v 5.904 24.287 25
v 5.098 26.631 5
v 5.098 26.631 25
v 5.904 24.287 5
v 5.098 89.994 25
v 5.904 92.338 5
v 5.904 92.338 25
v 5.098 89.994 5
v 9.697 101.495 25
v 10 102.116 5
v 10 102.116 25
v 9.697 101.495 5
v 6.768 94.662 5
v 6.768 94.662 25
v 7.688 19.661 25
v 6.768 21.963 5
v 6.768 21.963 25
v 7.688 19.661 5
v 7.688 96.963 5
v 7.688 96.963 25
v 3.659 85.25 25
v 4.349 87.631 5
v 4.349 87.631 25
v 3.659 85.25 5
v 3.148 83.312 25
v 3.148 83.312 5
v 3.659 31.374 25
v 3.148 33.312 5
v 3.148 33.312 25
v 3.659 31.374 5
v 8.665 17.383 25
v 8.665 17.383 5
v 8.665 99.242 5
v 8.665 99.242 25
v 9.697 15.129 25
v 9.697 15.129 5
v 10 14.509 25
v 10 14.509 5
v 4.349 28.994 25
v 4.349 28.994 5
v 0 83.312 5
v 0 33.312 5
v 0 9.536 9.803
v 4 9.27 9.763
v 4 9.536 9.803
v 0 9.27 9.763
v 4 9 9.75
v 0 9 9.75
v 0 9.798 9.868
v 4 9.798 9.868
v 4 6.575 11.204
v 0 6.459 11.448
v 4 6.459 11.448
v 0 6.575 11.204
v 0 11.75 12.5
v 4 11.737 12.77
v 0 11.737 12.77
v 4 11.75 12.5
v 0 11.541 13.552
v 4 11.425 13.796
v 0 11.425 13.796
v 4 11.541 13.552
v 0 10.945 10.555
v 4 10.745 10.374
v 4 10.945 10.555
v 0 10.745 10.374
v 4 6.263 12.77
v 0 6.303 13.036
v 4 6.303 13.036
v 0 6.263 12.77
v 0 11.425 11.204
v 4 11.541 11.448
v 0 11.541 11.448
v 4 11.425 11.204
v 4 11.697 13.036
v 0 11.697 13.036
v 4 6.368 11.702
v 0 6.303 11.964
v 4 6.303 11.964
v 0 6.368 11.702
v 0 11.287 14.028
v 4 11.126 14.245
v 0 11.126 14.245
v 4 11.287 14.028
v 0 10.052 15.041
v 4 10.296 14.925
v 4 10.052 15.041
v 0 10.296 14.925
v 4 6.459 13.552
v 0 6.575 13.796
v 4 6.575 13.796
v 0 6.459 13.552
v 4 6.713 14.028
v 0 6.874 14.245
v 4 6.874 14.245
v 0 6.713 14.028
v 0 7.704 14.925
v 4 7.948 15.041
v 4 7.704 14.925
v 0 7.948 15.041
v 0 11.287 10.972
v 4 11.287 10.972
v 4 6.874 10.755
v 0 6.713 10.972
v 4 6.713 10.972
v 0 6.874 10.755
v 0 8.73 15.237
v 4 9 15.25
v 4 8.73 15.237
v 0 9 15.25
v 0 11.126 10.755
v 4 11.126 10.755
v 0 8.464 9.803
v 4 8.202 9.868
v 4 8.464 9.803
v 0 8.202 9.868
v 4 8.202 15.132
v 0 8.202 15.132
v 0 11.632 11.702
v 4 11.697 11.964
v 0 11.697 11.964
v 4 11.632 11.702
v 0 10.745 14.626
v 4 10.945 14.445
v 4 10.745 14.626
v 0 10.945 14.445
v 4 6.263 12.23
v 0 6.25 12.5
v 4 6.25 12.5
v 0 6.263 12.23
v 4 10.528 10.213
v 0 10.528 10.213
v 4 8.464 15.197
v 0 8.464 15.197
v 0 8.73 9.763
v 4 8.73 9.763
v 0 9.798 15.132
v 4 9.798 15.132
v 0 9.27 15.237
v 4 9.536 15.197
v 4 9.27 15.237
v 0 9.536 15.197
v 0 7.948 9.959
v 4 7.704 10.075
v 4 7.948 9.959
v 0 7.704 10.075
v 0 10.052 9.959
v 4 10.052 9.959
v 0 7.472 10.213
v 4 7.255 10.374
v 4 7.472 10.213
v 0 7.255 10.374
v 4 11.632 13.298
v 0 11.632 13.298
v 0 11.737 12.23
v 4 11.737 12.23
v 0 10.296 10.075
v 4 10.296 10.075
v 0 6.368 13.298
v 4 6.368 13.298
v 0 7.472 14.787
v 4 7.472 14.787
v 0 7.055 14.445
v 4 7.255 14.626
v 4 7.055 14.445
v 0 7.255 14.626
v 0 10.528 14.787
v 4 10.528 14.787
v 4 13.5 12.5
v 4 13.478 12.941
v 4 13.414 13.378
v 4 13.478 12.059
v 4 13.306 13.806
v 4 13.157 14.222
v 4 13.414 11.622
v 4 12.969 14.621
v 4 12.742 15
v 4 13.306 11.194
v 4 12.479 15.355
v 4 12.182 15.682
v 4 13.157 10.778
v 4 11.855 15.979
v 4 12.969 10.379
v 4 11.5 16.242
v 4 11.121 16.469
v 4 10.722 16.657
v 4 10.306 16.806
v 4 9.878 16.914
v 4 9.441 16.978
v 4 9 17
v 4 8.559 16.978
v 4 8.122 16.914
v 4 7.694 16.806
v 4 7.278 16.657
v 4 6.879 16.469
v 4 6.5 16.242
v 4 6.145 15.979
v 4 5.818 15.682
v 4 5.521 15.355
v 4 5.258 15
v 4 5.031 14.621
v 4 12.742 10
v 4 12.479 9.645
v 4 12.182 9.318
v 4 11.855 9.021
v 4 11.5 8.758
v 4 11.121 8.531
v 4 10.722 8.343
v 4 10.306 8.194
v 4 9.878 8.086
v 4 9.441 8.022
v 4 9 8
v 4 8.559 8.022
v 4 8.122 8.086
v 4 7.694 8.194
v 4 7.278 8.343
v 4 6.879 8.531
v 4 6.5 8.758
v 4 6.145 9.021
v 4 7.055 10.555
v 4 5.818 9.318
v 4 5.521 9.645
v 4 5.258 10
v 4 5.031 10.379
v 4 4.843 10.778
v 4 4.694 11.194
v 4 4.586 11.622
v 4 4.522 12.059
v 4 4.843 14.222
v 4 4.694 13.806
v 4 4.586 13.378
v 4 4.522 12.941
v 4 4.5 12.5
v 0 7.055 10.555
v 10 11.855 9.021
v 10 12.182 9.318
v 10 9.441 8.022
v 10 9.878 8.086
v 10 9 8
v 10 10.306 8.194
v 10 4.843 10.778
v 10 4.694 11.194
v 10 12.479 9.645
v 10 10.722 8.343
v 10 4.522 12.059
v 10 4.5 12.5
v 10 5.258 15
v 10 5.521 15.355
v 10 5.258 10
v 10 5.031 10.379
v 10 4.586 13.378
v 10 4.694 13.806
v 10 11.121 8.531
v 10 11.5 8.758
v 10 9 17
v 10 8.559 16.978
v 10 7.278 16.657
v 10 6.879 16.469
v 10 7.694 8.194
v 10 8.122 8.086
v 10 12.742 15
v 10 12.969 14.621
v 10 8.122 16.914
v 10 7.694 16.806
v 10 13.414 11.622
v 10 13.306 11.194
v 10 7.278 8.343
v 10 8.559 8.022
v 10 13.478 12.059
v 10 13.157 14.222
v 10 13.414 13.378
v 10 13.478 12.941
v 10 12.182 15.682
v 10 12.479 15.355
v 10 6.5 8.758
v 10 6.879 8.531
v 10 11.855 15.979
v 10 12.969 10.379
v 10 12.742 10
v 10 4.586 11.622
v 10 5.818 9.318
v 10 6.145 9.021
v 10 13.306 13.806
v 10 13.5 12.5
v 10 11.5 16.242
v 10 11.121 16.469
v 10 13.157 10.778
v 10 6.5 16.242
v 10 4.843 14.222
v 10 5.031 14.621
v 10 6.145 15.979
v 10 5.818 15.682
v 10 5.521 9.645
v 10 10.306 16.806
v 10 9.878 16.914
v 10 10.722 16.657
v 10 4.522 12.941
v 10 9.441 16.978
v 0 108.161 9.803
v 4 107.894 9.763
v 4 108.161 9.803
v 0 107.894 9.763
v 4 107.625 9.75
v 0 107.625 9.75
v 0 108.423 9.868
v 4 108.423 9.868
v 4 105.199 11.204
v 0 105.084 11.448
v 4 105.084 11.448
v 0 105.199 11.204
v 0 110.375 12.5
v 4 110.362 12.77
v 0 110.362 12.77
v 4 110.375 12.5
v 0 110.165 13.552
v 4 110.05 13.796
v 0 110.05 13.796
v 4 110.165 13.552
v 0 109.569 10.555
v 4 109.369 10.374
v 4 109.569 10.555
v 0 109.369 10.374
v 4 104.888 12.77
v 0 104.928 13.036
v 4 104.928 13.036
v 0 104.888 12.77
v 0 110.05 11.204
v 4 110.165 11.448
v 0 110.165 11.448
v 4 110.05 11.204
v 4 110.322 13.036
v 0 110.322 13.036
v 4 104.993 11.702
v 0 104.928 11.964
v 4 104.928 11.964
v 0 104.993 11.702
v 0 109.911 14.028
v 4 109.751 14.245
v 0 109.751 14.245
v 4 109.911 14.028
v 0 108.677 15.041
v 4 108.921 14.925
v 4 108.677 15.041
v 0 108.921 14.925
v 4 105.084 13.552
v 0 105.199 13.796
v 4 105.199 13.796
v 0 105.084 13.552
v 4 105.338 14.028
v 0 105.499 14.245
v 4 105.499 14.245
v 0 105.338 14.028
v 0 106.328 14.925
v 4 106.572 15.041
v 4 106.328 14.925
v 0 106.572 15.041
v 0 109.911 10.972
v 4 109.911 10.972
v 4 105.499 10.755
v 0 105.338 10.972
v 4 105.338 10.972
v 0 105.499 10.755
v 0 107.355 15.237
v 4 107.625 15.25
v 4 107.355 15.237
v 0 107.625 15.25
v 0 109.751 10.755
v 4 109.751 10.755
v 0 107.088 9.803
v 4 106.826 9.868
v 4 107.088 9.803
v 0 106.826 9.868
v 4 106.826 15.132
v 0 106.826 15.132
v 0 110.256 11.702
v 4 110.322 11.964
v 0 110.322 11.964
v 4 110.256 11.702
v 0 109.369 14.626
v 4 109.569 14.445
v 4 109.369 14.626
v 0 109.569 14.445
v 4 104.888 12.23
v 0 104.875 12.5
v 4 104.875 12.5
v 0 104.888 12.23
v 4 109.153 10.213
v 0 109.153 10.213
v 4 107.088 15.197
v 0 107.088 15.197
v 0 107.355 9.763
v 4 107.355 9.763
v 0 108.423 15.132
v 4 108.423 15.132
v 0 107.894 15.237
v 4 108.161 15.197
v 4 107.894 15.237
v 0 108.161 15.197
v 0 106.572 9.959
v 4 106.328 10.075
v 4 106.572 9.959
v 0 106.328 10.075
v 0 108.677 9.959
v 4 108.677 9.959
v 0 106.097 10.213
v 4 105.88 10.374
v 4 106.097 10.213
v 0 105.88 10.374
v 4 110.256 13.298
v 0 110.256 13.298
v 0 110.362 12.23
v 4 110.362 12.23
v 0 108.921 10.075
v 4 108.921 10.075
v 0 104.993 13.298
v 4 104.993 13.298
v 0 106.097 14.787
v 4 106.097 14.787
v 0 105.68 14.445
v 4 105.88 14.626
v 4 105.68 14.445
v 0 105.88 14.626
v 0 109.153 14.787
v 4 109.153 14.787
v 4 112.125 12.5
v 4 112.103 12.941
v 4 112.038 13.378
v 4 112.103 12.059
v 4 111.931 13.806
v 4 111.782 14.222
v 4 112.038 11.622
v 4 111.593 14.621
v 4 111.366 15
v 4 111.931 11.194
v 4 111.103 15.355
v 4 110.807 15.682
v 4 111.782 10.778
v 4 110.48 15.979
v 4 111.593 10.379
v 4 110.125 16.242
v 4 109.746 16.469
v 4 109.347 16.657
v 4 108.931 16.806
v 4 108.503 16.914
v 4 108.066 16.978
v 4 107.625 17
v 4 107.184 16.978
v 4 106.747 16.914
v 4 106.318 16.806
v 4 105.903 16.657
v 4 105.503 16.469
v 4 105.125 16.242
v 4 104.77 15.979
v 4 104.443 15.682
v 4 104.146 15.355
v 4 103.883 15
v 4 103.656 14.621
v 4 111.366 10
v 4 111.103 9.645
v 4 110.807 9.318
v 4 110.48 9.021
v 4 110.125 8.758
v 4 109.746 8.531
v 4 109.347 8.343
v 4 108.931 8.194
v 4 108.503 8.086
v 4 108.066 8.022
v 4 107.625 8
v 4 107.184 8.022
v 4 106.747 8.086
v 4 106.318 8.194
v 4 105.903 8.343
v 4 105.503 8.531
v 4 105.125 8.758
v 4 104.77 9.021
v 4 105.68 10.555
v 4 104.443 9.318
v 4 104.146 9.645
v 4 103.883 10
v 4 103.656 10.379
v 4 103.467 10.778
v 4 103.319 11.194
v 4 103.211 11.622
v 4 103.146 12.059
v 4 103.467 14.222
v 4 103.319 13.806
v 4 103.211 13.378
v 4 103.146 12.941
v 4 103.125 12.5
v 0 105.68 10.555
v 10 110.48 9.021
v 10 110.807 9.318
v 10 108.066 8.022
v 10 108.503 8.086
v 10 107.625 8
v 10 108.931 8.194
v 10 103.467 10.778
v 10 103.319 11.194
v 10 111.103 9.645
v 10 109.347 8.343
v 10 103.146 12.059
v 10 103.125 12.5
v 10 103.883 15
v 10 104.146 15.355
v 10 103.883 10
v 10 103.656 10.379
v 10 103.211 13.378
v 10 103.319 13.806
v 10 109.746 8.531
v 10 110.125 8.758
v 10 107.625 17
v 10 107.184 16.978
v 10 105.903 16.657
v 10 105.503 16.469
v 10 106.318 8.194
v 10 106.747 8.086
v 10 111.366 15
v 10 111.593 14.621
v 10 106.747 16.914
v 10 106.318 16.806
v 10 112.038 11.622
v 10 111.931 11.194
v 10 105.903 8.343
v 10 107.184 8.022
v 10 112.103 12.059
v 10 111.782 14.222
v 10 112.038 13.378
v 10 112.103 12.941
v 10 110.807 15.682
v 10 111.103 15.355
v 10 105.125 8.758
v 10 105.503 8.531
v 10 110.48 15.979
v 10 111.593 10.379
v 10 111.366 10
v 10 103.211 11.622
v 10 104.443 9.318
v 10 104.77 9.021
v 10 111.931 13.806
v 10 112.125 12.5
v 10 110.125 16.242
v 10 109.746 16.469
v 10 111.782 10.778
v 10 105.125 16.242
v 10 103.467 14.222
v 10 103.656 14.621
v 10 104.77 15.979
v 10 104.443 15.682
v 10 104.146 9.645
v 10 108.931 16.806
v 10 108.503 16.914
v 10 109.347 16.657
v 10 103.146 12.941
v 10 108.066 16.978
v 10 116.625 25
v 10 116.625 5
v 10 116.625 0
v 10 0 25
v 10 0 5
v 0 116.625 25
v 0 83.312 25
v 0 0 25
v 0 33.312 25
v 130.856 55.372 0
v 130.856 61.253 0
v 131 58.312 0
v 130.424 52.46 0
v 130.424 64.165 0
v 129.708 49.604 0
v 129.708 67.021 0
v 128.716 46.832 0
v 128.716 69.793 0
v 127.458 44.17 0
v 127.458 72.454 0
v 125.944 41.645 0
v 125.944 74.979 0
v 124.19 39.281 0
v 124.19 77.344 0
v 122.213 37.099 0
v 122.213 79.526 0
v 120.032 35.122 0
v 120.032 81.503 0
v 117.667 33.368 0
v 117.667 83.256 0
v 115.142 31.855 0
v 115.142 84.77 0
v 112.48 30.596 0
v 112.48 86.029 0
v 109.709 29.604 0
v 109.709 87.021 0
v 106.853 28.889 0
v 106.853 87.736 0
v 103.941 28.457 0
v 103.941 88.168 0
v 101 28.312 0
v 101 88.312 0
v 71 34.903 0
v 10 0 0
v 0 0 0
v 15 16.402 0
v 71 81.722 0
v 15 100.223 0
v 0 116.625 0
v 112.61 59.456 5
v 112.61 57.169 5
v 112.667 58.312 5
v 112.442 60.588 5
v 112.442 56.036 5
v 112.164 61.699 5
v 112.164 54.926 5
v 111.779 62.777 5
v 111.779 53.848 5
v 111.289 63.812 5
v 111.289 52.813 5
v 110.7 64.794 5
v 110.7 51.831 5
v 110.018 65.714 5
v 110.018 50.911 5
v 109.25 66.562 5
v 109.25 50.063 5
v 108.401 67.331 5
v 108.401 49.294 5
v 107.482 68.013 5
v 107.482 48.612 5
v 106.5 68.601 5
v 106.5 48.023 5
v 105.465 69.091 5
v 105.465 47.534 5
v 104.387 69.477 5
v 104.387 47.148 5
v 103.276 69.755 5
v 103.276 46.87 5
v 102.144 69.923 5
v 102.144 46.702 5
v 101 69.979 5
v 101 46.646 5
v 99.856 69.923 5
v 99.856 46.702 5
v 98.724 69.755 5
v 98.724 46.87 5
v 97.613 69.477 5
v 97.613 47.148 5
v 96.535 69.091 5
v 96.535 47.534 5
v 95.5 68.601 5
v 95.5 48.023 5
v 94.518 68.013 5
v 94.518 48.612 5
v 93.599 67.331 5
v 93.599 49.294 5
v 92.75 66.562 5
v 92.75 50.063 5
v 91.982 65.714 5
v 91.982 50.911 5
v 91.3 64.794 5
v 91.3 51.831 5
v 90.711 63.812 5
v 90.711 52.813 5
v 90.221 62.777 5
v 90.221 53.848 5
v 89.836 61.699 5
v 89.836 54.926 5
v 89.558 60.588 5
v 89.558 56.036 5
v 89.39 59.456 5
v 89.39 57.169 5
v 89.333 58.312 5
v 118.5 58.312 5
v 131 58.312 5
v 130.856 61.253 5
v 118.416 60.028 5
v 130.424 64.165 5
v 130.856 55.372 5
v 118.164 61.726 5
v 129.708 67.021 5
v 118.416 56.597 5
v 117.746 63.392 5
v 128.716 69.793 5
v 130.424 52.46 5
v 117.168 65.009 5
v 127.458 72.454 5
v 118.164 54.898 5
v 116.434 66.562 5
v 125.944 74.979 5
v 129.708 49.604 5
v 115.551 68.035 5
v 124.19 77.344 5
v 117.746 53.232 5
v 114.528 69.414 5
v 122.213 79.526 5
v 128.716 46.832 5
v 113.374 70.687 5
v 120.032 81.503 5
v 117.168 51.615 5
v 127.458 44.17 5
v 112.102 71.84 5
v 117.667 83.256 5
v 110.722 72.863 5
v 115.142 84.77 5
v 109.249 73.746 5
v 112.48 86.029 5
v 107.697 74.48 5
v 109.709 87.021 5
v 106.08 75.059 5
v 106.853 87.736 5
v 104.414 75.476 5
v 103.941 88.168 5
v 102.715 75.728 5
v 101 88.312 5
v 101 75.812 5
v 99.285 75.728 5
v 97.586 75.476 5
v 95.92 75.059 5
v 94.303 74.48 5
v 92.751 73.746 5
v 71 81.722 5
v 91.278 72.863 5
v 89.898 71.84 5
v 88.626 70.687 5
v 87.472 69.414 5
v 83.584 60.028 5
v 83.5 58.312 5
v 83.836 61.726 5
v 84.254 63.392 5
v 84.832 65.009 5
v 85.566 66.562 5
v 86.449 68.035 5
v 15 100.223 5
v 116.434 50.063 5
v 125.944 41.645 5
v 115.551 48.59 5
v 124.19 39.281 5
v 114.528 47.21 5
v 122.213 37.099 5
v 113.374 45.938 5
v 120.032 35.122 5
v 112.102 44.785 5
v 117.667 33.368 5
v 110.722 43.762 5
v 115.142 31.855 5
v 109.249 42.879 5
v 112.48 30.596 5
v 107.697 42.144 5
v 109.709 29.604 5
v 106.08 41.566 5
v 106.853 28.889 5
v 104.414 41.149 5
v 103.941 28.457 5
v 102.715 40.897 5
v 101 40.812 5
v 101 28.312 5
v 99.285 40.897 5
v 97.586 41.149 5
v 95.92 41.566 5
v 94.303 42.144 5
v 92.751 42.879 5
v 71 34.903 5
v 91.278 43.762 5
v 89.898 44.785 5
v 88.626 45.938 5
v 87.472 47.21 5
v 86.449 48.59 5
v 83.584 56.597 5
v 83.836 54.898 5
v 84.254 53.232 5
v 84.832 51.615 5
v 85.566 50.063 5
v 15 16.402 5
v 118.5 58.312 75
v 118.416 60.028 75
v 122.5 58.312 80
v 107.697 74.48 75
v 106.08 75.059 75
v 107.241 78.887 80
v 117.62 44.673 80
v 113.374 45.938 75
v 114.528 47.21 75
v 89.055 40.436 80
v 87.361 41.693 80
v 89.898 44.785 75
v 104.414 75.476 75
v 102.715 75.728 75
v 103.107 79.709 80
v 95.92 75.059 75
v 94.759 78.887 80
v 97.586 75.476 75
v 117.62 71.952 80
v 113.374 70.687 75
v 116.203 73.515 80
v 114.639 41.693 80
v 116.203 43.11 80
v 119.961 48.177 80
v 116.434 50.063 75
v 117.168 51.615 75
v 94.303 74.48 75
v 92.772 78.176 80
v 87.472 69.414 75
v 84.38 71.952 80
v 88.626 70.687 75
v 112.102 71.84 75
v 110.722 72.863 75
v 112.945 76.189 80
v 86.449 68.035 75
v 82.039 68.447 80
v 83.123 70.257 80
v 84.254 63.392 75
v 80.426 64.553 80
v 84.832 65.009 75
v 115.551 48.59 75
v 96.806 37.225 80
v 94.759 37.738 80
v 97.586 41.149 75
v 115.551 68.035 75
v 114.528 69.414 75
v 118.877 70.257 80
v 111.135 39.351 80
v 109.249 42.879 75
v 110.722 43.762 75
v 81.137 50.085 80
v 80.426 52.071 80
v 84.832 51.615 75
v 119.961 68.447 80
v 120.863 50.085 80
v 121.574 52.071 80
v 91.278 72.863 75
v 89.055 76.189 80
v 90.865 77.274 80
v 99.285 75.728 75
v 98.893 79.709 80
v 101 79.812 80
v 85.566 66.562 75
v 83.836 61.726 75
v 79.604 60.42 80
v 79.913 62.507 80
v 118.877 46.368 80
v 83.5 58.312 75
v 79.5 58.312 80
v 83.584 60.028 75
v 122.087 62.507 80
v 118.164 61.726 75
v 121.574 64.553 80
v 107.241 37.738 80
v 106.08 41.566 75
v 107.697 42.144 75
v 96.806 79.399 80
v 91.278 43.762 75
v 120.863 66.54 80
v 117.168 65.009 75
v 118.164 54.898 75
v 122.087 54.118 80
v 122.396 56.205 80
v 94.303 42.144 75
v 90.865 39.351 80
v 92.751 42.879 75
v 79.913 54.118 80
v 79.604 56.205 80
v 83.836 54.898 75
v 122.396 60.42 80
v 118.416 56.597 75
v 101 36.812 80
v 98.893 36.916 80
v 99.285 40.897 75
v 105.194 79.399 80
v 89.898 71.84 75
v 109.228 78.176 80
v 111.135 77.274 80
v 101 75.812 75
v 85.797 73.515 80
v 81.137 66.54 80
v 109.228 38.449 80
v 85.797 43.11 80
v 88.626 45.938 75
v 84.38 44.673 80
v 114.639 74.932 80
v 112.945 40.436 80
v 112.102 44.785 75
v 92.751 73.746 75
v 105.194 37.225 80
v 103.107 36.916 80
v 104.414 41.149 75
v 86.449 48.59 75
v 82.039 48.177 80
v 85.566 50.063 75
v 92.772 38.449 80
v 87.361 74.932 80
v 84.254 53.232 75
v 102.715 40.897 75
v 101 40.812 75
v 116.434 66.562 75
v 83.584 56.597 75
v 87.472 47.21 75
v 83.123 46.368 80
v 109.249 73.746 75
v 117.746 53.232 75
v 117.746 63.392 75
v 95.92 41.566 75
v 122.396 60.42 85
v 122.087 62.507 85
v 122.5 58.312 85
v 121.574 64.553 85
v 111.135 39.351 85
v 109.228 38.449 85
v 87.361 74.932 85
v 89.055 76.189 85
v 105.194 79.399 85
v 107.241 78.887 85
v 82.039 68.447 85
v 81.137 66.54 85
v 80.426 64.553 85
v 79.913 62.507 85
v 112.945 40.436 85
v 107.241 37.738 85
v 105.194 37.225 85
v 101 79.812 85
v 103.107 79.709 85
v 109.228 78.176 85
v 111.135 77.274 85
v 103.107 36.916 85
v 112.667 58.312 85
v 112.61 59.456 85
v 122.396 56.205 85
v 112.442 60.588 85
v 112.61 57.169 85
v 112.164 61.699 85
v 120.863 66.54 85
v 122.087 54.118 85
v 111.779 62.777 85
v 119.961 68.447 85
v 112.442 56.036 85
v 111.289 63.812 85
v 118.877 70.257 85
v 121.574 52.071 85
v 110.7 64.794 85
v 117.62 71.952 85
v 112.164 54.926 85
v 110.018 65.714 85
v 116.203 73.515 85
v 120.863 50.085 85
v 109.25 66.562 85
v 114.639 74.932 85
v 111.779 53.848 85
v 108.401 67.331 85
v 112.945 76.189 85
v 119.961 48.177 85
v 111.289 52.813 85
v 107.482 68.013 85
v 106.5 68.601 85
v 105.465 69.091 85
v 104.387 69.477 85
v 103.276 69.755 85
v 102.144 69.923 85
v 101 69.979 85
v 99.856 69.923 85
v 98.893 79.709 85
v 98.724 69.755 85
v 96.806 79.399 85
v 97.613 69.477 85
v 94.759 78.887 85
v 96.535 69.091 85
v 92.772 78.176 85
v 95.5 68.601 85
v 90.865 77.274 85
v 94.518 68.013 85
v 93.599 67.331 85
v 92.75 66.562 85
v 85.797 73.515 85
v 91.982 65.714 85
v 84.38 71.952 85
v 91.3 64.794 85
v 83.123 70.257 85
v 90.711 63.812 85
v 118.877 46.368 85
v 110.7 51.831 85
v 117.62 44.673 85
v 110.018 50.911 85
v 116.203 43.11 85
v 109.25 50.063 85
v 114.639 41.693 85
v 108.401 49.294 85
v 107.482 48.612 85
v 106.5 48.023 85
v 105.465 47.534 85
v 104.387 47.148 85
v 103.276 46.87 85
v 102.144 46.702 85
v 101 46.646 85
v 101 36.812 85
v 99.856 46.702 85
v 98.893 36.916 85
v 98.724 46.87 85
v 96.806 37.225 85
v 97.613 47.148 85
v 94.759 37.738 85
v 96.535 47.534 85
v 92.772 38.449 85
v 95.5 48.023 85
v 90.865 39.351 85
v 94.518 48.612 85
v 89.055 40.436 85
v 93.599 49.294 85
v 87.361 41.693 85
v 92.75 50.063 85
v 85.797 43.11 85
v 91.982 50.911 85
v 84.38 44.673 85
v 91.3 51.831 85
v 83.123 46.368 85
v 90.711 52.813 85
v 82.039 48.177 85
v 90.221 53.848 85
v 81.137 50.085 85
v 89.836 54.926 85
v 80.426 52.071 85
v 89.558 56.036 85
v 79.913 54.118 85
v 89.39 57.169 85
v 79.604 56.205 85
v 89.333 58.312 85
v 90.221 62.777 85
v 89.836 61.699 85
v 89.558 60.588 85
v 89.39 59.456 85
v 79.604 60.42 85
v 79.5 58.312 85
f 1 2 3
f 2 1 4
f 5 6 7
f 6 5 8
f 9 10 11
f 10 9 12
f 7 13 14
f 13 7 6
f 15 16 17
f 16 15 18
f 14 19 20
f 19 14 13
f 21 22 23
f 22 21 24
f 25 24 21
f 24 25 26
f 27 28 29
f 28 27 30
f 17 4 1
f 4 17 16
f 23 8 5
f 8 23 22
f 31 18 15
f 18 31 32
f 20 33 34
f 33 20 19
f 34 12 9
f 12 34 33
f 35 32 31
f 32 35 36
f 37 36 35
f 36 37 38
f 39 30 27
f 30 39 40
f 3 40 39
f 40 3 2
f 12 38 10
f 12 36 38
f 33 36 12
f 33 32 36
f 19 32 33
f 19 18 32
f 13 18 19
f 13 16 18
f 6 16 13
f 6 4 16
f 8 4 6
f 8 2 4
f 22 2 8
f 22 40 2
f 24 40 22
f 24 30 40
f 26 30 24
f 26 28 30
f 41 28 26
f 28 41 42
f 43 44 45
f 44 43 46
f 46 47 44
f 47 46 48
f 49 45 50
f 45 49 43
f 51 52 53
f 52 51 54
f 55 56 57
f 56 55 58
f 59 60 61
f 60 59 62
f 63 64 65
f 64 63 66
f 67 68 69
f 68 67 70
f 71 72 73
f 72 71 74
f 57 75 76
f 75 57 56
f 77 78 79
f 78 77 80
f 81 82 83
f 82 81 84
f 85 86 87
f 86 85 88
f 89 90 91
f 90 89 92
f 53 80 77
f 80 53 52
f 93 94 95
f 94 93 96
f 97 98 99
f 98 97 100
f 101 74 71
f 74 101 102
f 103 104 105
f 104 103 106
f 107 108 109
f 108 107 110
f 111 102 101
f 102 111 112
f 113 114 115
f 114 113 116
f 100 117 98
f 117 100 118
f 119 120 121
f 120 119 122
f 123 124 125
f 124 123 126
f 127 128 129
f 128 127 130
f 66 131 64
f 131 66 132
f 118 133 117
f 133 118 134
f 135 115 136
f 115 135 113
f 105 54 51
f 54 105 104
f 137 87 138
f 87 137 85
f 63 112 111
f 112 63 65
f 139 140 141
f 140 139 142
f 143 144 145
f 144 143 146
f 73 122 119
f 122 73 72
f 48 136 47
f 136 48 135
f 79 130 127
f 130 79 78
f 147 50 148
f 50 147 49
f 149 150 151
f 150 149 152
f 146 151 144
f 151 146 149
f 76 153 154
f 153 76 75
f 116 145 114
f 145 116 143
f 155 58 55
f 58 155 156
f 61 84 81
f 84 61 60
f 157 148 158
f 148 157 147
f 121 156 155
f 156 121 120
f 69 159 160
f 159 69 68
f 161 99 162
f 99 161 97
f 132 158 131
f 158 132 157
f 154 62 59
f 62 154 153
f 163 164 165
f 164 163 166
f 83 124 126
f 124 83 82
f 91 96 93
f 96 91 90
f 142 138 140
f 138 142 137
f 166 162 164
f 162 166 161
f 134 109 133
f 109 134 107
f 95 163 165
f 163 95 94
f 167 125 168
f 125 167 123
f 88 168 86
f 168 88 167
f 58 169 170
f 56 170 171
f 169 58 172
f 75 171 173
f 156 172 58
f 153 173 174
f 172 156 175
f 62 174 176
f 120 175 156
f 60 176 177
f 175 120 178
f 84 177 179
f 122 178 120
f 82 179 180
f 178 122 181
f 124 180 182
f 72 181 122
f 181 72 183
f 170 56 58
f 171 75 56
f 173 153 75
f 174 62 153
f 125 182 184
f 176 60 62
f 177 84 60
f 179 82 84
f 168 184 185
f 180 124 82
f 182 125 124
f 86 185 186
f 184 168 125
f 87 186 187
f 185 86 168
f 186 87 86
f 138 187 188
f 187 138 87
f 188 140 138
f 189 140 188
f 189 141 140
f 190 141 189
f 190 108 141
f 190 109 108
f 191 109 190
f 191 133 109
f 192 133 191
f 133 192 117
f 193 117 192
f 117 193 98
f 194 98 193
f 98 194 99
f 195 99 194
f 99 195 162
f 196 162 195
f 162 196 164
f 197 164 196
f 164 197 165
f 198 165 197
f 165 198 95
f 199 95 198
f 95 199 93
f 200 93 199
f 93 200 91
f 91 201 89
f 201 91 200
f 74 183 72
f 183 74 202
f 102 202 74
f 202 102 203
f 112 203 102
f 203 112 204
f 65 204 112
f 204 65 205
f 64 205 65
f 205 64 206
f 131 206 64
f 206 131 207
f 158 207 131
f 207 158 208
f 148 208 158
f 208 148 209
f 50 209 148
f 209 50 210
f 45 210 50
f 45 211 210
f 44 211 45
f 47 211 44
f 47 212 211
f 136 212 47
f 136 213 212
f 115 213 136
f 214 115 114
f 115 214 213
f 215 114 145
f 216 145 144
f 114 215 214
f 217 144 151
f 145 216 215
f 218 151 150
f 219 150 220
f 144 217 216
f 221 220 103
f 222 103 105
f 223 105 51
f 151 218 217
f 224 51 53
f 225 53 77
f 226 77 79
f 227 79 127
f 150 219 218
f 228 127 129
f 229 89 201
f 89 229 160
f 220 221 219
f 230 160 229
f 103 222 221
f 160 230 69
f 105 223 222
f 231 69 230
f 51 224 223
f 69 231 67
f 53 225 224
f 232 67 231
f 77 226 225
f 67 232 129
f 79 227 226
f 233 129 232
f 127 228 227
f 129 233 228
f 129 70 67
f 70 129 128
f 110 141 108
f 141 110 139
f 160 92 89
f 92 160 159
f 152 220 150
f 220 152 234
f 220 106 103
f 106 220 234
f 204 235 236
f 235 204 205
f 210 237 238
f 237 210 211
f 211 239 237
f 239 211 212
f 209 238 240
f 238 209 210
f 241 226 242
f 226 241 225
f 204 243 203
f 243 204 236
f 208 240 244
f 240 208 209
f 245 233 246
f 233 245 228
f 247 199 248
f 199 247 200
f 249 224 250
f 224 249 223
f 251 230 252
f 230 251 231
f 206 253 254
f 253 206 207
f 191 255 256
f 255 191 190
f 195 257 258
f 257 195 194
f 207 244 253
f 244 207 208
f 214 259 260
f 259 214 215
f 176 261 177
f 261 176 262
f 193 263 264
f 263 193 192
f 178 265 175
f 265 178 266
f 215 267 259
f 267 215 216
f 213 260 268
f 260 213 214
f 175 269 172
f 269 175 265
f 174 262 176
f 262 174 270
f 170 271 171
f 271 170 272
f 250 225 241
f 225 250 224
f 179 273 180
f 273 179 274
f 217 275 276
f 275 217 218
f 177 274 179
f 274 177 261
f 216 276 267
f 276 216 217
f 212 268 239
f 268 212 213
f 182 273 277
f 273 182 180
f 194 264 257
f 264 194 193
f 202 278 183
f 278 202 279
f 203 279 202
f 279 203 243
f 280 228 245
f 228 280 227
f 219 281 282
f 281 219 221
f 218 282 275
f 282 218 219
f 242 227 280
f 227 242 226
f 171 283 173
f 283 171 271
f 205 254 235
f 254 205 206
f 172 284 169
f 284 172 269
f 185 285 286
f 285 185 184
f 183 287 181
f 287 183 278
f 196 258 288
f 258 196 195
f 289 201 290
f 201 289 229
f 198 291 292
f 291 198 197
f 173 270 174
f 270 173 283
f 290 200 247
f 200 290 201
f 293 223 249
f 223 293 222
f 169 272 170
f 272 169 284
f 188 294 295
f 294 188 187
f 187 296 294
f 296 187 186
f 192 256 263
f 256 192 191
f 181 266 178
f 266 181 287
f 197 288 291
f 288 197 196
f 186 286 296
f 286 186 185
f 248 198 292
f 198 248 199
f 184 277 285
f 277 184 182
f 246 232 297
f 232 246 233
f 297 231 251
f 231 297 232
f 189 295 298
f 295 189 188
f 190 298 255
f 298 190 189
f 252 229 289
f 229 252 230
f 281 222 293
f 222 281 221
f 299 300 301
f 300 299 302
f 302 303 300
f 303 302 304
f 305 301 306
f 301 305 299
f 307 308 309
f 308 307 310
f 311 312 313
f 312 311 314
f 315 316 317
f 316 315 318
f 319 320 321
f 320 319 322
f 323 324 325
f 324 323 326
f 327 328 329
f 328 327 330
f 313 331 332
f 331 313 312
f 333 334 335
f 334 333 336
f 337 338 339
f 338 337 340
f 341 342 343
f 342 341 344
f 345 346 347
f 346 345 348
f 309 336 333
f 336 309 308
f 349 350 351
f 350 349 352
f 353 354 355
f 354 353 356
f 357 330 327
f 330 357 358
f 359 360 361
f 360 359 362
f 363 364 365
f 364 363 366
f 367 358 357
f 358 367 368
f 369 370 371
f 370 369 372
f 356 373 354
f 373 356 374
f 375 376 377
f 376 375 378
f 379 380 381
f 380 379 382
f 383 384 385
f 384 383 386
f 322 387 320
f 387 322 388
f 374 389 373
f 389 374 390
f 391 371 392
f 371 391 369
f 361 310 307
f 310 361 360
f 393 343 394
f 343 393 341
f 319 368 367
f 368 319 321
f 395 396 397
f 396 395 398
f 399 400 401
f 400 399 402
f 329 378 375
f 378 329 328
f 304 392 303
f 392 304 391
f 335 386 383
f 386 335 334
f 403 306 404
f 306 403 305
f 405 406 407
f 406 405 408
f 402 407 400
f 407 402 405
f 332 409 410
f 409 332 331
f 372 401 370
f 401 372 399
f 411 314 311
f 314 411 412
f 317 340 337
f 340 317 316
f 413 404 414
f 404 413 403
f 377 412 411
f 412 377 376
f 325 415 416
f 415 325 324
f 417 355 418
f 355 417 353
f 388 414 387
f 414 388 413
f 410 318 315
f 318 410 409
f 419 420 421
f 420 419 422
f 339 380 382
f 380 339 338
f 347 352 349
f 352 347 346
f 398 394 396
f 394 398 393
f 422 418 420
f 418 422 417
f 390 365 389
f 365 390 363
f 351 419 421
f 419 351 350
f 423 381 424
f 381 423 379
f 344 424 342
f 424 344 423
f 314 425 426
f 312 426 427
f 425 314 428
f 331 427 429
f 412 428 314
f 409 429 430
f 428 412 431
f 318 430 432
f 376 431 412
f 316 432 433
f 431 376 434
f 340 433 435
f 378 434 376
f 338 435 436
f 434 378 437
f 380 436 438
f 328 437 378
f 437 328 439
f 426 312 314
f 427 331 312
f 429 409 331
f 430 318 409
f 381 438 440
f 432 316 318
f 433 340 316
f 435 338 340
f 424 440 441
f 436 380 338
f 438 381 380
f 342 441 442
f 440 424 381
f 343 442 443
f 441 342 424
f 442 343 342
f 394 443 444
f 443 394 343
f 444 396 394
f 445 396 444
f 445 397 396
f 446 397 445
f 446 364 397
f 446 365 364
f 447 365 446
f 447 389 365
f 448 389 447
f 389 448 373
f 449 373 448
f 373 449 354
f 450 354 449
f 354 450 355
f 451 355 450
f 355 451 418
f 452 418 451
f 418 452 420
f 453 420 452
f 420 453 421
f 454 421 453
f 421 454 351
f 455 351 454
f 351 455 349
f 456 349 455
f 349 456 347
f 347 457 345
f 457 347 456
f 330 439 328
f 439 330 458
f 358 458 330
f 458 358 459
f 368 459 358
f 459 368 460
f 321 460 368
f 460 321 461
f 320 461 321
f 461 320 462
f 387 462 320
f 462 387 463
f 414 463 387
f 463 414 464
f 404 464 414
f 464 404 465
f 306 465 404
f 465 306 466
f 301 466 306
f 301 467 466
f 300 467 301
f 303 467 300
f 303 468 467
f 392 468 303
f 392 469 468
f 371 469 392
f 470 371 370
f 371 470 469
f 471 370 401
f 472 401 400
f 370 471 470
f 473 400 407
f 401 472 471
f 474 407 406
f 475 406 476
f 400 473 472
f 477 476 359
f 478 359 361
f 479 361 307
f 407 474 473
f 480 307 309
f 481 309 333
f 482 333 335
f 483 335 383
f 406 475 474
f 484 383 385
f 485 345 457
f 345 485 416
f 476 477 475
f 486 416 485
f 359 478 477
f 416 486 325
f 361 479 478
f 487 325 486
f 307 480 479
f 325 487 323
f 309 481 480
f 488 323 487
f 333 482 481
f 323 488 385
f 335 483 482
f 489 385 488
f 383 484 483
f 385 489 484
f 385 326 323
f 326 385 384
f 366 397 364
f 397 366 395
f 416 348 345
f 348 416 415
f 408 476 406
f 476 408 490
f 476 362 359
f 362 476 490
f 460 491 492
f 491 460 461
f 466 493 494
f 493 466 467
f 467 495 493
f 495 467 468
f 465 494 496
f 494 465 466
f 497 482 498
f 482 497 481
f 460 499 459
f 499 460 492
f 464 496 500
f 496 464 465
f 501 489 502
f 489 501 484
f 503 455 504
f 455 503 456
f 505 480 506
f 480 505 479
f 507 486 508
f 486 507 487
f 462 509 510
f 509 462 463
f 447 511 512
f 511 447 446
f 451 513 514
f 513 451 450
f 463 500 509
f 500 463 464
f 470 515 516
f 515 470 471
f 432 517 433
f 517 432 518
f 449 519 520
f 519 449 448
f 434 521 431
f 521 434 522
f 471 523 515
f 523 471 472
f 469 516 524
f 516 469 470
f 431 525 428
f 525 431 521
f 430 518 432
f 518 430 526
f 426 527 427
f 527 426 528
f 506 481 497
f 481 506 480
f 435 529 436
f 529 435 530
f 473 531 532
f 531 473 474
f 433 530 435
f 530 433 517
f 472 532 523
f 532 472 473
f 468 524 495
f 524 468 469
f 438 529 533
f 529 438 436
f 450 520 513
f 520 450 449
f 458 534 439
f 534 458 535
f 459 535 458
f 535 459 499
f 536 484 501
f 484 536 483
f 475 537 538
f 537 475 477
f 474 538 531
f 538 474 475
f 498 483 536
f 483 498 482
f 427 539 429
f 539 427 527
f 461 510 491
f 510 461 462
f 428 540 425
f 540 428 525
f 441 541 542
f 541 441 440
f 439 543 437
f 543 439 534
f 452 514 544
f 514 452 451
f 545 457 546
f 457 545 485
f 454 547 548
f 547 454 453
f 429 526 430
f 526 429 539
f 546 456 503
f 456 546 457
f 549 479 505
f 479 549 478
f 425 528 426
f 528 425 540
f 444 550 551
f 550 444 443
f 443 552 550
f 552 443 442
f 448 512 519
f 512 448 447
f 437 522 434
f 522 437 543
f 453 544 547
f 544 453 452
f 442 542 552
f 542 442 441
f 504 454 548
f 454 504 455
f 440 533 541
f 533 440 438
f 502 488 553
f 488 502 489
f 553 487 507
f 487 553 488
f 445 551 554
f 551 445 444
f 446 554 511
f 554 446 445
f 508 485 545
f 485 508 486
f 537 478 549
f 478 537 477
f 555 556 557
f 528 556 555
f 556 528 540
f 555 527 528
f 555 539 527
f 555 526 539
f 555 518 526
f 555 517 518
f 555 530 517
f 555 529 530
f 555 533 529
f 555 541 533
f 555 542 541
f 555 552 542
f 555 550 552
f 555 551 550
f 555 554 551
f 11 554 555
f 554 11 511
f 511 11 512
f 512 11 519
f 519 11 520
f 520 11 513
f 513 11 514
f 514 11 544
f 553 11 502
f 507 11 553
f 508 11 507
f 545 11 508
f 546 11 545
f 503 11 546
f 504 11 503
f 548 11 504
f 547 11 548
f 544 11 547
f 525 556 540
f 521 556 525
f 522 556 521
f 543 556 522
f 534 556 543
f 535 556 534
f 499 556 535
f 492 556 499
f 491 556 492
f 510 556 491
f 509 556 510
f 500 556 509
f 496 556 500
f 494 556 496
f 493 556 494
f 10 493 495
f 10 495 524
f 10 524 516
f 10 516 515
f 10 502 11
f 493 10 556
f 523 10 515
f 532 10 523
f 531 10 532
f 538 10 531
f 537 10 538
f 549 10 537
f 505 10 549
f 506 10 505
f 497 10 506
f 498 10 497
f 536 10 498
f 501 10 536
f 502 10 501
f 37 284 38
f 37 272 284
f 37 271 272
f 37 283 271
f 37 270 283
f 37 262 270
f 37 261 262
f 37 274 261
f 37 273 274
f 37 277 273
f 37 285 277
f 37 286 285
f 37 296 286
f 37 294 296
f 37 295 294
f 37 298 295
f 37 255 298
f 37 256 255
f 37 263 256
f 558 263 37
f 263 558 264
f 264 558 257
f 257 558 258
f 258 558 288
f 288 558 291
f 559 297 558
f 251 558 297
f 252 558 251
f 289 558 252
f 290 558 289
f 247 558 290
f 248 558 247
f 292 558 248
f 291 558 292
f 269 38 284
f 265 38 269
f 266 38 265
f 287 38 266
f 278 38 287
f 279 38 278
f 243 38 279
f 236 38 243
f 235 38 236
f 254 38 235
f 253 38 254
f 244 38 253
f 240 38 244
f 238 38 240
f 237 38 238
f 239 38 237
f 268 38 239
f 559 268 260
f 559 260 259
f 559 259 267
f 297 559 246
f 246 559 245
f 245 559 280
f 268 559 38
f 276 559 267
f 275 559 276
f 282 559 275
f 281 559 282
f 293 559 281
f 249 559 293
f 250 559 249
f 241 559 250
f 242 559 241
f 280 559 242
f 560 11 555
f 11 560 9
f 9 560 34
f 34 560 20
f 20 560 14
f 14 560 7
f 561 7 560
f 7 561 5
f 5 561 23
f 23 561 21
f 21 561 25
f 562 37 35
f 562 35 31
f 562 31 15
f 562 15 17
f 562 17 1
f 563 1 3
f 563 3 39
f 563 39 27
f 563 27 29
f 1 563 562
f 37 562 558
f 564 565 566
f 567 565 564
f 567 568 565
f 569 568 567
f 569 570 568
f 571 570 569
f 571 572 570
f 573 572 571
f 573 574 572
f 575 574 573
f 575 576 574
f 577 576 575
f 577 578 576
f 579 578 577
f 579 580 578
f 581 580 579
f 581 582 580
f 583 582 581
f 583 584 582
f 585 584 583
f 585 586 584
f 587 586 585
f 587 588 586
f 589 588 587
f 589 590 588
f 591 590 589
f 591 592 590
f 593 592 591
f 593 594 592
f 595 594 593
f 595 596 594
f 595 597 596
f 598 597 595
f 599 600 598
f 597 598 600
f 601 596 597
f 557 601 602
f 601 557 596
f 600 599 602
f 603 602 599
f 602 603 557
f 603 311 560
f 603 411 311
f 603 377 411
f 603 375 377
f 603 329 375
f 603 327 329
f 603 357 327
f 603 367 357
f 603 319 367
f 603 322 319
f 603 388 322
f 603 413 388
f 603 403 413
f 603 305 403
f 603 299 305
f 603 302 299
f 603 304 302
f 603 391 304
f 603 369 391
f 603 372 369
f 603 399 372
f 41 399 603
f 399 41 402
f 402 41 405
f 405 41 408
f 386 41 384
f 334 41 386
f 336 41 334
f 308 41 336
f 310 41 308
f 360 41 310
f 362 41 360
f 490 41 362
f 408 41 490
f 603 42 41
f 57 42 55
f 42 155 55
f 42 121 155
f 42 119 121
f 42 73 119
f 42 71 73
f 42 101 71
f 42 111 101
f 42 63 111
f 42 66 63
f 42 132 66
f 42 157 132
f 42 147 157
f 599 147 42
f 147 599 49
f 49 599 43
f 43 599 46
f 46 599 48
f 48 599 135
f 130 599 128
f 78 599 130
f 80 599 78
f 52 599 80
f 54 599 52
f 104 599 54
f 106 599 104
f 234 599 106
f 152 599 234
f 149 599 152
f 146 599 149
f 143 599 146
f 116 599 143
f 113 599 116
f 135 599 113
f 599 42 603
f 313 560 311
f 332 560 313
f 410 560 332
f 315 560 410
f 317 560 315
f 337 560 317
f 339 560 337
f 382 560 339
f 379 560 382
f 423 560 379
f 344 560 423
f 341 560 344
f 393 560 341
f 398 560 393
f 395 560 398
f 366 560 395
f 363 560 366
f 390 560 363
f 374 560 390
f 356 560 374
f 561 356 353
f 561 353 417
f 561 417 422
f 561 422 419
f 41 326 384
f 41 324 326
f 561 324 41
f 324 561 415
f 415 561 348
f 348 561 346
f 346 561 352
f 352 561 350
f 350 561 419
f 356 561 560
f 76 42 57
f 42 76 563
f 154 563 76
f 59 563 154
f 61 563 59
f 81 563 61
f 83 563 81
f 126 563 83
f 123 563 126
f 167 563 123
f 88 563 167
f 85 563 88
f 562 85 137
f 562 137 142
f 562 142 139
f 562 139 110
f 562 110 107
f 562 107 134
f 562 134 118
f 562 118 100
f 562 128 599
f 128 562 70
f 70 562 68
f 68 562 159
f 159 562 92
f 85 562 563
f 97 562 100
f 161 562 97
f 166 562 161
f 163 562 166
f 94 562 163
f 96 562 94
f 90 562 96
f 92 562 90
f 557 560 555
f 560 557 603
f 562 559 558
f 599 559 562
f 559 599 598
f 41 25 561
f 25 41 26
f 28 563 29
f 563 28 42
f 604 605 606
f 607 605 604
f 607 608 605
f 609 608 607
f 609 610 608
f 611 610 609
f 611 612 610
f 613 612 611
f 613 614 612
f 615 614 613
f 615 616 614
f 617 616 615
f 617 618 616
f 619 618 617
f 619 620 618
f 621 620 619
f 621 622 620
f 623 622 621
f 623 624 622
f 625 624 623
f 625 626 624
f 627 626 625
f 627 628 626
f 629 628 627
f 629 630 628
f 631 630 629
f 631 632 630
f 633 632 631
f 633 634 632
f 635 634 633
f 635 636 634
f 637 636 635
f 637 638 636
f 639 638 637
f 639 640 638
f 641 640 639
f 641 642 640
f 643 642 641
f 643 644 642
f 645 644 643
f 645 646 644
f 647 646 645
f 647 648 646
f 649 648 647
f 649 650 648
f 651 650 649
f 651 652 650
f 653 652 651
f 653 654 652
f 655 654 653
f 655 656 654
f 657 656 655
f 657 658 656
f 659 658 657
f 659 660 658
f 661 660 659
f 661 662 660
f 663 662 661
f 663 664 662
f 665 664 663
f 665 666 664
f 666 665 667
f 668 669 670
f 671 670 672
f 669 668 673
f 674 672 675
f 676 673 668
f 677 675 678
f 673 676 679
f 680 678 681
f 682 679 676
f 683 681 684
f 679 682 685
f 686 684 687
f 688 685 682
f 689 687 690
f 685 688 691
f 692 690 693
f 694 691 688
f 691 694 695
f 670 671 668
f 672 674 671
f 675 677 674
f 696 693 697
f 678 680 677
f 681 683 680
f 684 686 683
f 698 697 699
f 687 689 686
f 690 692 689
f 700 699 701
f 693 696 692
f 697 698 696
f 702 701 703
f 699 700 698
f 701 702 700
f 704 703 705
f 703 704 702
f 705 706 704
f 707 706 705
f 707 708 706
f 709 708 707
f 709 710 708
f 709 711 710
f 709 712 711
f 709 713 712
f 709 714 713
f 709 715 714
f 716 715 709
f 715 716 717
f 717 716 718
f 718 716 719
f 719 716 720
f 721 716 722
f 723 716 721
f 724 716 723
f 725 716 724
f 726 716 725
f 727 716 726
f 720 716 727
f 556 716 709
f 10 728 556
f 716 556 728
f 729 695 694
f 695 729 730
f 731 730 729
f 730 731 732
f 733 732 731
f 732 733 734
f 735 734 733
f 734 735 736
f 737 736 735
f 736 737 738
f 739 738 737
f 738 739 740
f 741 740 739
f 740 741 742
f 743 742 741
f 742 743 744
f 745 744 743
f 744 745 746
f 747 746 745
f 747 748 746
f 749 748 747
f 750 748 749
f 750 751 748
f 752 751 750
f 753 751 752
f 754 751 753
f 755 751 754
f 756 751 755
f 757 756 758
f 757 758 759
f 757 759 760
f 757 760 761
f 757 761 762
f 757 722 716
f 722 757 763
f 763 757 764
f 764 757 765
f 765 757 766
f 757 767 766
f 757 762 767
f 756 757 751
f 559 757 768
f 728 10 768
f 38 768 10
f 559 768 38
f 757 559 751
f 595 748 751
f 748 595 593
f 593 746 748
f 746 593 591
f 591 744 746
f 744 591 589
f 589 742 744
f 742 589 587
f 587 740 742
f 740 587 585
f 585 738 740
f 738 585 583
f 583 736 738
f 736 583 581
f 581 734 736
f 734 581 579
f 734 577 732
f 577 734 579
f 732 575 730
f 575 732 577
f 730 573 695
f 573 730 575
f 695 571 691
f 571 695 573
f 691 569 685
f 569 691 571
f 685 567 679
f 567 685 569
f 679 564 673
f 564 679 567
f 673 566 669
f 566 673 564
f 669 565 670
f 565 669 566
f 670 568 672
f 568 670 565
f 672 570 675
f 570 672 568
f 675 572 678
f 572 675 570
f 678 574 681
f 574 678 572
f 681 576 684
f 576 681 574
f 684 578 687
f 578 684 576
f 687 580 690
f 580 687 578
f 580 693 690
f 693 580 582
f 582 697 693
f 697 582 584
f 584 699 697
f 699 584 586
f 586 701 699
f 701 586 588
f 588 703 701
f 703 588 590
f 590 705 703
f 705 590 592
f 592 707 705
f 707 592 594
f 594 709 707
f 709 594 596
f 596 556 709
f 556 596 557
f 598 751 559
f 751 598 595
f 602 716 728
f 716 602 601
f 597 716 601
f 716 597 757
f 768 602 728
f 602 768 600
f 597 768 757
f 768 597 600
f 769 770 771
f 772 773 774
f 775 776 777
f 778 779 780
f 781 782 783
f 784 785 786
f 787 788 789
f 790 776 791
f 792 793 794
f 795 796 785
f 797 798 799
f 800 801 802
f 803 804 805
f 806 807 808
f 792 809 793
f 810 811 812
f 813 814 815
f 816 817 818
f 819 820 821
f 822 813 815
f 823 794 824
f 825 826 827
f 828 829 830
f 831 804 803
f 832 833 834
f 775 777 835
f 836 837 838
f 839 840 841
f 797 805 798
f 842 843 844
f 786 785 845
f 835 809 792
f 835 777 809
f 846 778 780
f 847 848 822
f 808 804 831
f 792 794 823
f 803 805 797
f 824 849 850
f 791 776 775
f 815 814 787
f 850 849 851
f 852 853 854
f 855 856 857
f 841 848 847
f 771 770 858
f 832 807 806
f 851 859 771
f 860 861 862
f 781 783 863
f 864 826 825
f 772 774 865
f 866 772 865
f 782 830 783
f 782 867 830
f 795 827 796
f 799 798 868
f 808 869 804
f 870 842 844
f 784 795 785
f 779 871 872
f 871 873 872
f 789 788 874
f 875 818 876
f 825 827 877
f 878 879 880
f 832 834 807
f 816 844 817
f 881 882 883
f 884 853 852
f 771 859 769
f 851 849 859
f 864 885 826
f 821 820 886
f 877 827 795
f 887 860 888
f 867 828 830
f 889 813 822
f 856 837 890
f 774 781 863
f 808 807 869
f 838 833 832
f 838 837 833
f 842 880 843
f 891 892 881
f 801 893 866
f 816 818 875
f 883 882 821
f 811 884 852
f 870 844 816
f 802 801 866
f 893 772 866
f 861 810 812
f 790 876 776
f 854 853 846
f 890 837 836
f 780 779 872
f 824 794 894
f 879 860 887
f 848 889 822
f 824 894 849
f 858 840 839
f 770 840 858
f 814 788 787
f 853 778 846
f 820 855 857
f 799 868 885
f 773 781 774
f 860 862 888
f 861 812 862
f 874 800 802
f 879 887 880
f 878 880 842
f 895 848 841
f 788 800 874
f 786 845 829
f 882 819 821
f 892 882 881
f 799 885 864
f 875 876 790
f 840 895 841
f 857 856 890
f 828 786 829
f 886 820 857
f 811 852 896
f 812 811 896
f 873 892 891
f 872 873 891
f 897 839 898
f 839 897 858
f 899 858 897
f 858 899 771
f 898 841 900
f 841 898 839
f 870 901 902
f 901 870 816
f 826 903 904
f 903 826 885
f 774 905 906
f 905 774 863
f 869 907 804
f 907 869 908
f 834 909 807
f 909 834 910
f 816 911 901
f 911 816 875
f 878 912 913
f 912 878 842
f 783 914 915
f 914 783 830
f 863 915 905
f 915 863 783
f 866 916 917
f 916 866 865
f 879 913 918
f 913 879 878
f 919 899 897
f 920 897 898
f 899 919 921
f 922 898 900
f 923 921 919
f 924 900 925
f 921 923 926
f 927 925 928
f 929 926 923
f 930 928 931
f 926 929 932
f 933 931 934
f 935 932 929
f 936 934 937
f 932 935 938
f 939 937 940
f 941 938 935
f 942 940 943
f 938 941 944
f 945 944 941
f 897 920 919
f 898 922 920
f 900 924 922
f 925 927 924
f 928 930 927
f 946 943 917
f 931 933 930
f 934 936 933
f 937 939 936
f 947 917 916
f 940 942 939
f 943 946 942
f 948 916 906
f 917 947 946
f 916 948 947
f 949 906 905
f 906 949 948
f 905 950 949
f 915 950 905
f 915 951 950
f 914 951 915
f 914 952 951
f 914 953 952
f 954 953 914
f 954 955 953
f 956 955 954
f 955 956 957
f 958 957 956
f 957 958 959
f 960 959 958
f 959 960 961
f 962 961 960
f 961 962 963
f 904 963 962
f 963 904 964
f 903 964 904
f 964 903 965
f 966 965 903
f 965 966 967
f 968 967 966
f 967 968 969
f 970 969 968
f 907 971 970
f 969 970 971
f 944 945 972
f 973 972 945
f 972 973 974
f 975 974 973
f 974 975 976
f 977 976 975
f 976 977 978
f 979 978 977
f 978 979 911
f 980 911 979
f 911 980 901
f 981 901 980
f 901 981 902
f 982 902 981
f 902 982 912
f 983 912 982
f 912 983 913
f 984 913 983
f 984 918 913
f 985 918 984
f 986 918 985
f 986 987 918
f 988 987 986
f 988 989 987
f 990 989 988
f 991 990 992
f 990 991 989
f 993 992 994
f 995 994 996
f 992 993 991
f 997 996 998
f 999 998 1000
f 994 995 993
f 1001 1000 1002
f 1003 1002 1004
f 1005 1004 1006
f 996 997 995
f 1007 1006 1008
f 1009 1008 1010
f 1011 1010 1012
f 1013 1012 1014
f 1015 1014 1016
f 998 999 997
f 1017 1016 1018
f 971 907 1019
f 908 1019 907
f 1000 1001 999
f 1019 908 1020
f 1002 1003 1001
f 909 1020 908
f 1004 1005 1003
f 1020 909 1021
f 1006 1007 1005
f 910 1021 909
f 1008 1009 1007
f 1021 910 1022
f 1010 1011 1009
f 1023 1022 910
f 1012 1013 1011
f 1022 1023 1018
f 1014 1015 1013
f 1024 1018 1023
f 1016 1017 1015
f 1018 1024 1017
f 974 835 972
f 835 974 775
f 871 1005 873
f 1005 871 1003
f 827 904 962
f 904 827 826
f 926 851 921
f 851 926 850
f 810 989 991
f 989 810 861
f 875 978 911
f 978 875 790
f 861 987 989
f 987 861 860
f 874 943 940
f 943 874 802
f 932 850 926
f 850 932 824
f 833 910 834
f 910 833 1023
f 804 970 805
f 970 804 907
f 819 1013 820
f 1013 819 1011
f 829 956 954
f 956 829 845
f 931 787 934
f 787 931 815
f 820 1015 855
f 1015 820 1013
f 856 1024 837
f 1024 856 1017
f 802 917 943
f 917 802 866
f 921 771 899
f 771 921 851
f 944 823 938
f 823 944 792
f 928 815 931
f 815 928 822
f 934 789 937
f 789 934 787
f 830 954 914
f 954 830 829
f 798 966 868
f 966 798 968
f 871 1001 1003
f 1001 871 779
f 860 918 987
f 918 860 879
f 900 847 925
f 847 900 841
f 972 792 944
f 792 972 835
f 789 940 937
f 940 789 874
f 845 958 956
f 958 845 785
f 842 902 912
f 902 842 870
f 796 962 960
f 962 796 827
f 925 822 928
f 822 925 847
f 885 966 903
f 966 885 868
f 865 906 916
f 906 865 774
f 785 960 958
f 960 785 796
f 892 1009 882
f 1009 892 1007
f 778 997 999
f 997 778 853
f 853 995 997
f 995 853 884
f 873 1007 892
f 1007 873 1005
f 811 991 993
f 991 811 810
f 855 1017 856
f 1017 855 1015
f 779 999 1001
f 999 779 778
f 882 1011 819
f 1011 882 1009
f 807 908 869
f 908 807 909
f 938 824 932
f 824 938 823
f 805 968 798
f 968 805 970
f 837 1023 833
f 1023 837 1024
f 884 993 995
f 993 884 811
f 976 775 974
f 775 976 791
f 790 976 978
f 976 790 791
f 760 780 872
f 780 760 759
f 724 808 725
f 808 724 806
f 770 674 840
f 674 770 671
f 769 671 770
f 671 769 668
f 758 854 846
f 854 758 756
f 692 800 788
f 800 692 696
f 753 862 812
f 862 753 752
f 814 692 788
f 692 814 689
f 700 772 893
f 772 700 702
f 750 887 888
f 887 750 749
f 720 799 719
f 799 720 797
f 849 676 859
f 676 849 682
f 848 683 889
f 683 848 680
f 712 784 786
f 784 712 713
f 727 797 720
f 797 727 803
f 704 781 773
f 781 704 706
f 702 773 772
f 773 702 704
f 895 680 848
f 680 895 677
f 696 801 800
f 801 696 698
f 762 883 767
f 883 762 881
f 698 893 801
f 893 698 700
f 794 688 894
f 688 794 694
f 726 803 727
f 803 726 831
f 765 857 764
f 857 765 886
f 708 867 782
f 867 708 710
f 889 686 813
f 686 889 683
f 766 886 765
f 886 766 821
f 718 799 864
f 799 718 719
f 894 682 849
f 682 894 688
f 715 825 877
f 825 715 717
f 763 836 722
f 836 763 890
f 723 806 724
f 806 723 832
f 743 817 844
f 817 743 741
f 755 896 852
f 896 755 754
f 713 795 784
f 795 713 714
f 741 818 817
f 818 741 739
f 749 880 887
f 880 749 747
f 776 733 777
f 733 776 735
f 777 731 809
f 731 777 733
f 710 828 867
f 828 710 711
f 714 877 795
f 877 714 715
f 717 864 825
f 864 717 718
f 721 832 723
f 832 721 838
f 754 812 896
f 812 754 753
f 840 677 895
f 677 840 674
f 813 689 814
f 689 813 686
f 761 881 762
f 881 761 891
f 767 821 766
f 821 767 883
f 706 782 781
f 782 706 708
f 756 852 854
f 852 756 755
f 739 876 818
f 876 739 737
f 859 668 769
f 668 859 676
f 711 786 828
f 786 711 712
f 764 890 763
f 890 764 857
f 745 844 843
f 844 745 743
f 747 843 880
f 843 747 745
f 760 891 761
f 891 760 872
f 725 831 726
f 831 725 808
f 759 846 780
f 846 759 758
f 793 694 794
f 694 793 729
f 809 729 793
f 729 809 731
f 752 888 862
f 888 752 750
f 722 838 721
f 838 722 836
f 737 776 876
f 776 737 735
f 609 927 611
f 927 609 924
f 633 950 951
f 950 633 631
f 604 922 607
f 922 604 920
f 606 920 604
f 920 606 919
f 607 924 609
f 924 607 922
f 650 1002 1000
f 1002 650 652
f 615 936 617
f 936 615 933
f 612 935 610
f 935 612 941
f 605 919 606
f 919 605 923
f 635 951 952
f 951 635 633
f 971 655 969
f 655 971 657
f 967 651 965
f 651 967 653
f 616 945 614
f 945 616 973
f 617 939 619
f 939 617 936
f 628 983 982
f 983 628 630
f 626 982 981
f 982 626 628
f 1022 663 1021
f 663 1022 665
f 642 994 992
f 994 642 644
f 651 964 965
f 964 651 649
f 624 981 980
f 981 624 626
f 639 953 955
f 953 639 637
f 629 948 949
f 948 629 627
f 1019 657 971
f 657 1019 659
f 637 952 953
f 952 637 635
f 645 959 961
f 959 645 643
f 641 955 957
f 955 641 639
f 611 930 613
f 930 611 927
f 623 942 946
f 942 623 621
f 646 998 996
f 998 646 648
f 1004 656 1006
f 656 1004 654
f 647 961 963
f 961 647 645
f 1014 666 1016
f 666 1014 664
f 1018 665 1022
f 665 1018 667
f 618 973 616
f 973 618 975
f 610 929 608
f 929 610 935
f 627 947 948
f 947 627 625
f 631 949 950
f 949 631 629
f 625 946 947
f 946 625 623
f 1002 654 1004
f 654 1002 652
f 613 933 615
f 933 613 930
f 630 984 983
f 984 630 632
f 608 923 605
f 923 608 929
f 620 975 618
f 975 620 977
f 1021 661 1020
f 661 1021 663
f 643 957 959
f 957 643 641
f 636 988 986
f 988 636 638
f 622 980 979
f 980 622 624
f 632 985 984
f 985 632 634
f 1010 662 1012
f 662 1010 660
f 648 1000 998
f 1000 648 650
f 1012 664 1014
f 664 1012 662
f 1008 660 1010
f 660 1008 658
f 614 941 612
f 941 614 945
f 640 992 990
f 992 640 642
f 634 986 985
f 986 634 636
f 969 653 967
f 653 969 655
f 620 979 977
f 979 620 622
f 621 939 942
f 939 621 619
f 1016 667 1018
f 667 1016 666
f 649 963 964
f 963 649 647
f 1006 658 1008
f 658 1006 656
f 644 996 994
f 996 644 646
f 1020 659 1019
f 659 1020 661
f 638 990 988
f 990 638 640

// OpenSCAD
// file: t-track.scad
function wSlot(type) =
  type == "25" ? 6.5 :
  undef;

function hSlot(type) =
  type == "25" ? 2.25 :
  undef;

function wChannel(type) =
  type == "25" ? [16.5, 5.5] :
  undef;

function hChannel(type) =
  type == "25" ? 5.5 :
  undef;

function rChannel(type) =
  type == "25" ? 1 :
  undef;

function wFrame(type) =
  type == "25" ? 25 :
  undef;

module Channel(type) {
  $fn = 64;
    sw = wSlot(type);
    sh = hSlot(type);
    cw = wChannel(type);
    ch = hChannel(type);
    r  = rChannel(type);

  translate([0, -sh]) {
    minkowski() {
      circle(r=1);
      offset(delta=-r) {
        polygon([
          [-cw[0]/2, 0],
          [ cw[0]/2, 0],
          [ cw[1]/2, -ch],
          [-cw[1]/2, -ch],
        ]);
      }
    }
    translate([-sw/2, 0])
      square([sw, sh]);
  }
}

Channel("25");
// file: hardware.scad
function dHex(e2e) = e2e / sin(60);
function rHex(e2e) = dHex(e2e) / 2;

module Hex(e2e, h) {
  r = rHex(e2e);
  x = r * cos(30);
  y = r * sin(30);
  linear_extrude(h) {
    polygon([
      [ r,  0],
      [ y,  x],
      [-y,  x],
      [-r,  0],
      [-y, -x],
      [ y, -x],
    ]);
  }
}

function dThread(std) =
  std == "6-32" ? 4 :
  // If it's not found, it is metric already.
  // Add 1/2mm tolerance so it doesn't bind.
  std + 0.5;

function rThread(std) = dThread(std) / 2;

// Thread diameter
// Thread length
// Thread padding
// Head diameter
// Head length
// Head padding
module ScrewStraightHead(td, tl, tp, hd, hl, hp) {
  translate([0, 0, -tp]) cylinder(d = td, h = tl + tp);
  translate([0, 0,  tl]) cylinder(d = hd, h = hl + hp);
}

// Thread diameter
// Thread length
// Thread padding
// Head diameter
// Head length 1: Length of chamfer.
// Head length 2: Length of head above chamfer edge.
// Head padding
module ScrewChamferHead(td, tl, tp, hd, hl1, hl2, hp) {
  translate([0, 0, -tp      ]) cylinder(d  = td,          h = tl + tp);
  translate([0, 0,  tl      ]) cylinder(d1 = td, d2 = hd, h = hl1);
  translate([0, 0,  tl + hl1]) cylinder(d  = hd,          h = hl2 + hp);
}

// Must provide either
// screw_l && head_l && head_d
// screw_l && thread_l && head_d
// screw_l && head_l1 && head_l2 && head_d1 && head_d2
// screw_l && thread_l && head_d
// thread_l && head_l && head_d
// thread_l && head_l1 && head_l2 && head_d1 && head_d2
module Screw(
  std,
  screw_l = undef,
  thread_l = undef,
  thread_padding = 0,
  head_l = undef,
  head_d = undef,
  head_l1 = undef,
  head_l2 = undef,
  head_padding = 0,
) {
  if (head_l1 && head_l2) {
    ScrewChamferHead(
      dThread(std),
      thread_l ? thread_l : screw_l - head_l1 - head_l2,
      thread_padding,
      head_d,
      head_l1,
      head_l2,
      head_padding
    );
  } else {
    ScrewStraightHead(
      dThread(std),
      thread_l ? thread_l : screw_l - head_l,
      thread_padding,
      head_d,
      head_l,
      head_padding
    );
  }
}

module CaseScrew(thread_padding = 0, head_padding = 0) {
  Screw(
    "6-32",
    screw_l = 9,
    head_l = 3,
    head_d = 9
  );
}

module HillmanNut() {
  Hex(8, 3);
}

module HillmanScrew(thread_padding = 0, head_padding = 0) {
  Screw(
    "6-32",
    screw_l = 13.3,
    head_l1 = 2.5,
    head_l2 = 0.75,
    head_d = 6.5
  );
}
// main file
use <hardware.scad>
use <t-track.scad>

$fn = 64;

track = "25";

spool_w = 70;
spool_d = 202;
spool_r = spool_d / 2;
hole_d = 50;
hole_r = hole_d /2;

hanger_h = spool_r / cos(30);

spool_dx = spool_r;
spool_dy = hanger_h / 2;
rod_d = 35;
rod_r = rod_d / 2;
cap_d = rod_d + 8;
cap_r = cap_d / 2;
cap_th1 = 5;
cap_th2 = 5;
cap_th = cap_th1 + cap_th2;
plat_d = hole_d + 10;
plat_r = plat_d / 2;

base_th = 5;
conn_w = 5;
conn_th = 10;

module Spool() {
  $fn = 256;
  difference() {
    cylinder(d = spool_d, h = spool_w);
    translate([0, 0, -1]) cylinder(d = hole_d, h = spool_w + 2);
  }
}

module Cap() {
  cylinder(d1 = rod_d, d2 = cap_d, h = cap_th1);
  translate([0, 0, cap_th1])
    cylinder(d = cap_d, h = cap_th2);
}

module Rod() {
  difference() {
    union() {
      cylinder(d = rod_d, h = spool_w);
      translate([0, 0, spool_w])
        Cap();
    }
    translate([0, 0, -1])
      cylinder(d = 2/3 * rod_d, h = spool_w + cap_th + 2);
  }
}

module Base() {
  difference() {
    cube([conn_th, hanger_h, wFrame(track)]);
    translate([spool_dx, spool_dy, base_th]) Spool();
    translate([-1, hanger_h / 2 - hole_r, base_th]) cube([conn_th + 2, hole_d, wFrame(track)]);
    screw_l = 13;
    head_l = 3.18;
    head_d = 9;
    screw_dx = 4 - screw_l + head_l;
    screw_dy = head_d;
    screw_dz = wFrame("25") / 2;
    translate([screw_dx, screw_dy, screw_dz])
      rotate([0, 90, 0])
        Screw(5, screw_l = screw_l, head_l = head_l, head_d = head_d, head_padding = conn_th);
    translate([screw_dx, hanger_h - screw_dy, screw_dz])
      rotate([0, 90, 0])
        Screw(5, screw_l = screw_l, head_l = head_l, head_d = head_d, head_padding = conn_th);
  }
  difference() {
    union() {
      linear_extrude(base_th) {
        polygon([
          [ conn_th,        0],
          [spool_dx, spool_dy - plat_r],
          [spool_dx, spool_dy + plat_r],
          [ conn_th, hanger_h],
        ]);
        translate([spool_dx, spool_dy])
          circle(d = plat_d);
      }
    }
    translate([0, 0, -1]) {
      th = 15;
      dx = spool_dx - plat_r;
      dy1 = (th - conn_th) * (spool_dy - plat_r) / spool_dx + th;
      dy2 = dx * (spool_dy - plat_r) / spool_dx + th;
      linear_extrude(base_th + 2) {
        polygon([
          [th, dy1],
          [dx, dy2],
          [dx, hanger_h - dy2],
          [th, hanger_h - dy1],
        ]);
      }
    }
  }
  translate([spool_dx, spool_dy, base_th]) {
    Rod();
  }
}

Base();
